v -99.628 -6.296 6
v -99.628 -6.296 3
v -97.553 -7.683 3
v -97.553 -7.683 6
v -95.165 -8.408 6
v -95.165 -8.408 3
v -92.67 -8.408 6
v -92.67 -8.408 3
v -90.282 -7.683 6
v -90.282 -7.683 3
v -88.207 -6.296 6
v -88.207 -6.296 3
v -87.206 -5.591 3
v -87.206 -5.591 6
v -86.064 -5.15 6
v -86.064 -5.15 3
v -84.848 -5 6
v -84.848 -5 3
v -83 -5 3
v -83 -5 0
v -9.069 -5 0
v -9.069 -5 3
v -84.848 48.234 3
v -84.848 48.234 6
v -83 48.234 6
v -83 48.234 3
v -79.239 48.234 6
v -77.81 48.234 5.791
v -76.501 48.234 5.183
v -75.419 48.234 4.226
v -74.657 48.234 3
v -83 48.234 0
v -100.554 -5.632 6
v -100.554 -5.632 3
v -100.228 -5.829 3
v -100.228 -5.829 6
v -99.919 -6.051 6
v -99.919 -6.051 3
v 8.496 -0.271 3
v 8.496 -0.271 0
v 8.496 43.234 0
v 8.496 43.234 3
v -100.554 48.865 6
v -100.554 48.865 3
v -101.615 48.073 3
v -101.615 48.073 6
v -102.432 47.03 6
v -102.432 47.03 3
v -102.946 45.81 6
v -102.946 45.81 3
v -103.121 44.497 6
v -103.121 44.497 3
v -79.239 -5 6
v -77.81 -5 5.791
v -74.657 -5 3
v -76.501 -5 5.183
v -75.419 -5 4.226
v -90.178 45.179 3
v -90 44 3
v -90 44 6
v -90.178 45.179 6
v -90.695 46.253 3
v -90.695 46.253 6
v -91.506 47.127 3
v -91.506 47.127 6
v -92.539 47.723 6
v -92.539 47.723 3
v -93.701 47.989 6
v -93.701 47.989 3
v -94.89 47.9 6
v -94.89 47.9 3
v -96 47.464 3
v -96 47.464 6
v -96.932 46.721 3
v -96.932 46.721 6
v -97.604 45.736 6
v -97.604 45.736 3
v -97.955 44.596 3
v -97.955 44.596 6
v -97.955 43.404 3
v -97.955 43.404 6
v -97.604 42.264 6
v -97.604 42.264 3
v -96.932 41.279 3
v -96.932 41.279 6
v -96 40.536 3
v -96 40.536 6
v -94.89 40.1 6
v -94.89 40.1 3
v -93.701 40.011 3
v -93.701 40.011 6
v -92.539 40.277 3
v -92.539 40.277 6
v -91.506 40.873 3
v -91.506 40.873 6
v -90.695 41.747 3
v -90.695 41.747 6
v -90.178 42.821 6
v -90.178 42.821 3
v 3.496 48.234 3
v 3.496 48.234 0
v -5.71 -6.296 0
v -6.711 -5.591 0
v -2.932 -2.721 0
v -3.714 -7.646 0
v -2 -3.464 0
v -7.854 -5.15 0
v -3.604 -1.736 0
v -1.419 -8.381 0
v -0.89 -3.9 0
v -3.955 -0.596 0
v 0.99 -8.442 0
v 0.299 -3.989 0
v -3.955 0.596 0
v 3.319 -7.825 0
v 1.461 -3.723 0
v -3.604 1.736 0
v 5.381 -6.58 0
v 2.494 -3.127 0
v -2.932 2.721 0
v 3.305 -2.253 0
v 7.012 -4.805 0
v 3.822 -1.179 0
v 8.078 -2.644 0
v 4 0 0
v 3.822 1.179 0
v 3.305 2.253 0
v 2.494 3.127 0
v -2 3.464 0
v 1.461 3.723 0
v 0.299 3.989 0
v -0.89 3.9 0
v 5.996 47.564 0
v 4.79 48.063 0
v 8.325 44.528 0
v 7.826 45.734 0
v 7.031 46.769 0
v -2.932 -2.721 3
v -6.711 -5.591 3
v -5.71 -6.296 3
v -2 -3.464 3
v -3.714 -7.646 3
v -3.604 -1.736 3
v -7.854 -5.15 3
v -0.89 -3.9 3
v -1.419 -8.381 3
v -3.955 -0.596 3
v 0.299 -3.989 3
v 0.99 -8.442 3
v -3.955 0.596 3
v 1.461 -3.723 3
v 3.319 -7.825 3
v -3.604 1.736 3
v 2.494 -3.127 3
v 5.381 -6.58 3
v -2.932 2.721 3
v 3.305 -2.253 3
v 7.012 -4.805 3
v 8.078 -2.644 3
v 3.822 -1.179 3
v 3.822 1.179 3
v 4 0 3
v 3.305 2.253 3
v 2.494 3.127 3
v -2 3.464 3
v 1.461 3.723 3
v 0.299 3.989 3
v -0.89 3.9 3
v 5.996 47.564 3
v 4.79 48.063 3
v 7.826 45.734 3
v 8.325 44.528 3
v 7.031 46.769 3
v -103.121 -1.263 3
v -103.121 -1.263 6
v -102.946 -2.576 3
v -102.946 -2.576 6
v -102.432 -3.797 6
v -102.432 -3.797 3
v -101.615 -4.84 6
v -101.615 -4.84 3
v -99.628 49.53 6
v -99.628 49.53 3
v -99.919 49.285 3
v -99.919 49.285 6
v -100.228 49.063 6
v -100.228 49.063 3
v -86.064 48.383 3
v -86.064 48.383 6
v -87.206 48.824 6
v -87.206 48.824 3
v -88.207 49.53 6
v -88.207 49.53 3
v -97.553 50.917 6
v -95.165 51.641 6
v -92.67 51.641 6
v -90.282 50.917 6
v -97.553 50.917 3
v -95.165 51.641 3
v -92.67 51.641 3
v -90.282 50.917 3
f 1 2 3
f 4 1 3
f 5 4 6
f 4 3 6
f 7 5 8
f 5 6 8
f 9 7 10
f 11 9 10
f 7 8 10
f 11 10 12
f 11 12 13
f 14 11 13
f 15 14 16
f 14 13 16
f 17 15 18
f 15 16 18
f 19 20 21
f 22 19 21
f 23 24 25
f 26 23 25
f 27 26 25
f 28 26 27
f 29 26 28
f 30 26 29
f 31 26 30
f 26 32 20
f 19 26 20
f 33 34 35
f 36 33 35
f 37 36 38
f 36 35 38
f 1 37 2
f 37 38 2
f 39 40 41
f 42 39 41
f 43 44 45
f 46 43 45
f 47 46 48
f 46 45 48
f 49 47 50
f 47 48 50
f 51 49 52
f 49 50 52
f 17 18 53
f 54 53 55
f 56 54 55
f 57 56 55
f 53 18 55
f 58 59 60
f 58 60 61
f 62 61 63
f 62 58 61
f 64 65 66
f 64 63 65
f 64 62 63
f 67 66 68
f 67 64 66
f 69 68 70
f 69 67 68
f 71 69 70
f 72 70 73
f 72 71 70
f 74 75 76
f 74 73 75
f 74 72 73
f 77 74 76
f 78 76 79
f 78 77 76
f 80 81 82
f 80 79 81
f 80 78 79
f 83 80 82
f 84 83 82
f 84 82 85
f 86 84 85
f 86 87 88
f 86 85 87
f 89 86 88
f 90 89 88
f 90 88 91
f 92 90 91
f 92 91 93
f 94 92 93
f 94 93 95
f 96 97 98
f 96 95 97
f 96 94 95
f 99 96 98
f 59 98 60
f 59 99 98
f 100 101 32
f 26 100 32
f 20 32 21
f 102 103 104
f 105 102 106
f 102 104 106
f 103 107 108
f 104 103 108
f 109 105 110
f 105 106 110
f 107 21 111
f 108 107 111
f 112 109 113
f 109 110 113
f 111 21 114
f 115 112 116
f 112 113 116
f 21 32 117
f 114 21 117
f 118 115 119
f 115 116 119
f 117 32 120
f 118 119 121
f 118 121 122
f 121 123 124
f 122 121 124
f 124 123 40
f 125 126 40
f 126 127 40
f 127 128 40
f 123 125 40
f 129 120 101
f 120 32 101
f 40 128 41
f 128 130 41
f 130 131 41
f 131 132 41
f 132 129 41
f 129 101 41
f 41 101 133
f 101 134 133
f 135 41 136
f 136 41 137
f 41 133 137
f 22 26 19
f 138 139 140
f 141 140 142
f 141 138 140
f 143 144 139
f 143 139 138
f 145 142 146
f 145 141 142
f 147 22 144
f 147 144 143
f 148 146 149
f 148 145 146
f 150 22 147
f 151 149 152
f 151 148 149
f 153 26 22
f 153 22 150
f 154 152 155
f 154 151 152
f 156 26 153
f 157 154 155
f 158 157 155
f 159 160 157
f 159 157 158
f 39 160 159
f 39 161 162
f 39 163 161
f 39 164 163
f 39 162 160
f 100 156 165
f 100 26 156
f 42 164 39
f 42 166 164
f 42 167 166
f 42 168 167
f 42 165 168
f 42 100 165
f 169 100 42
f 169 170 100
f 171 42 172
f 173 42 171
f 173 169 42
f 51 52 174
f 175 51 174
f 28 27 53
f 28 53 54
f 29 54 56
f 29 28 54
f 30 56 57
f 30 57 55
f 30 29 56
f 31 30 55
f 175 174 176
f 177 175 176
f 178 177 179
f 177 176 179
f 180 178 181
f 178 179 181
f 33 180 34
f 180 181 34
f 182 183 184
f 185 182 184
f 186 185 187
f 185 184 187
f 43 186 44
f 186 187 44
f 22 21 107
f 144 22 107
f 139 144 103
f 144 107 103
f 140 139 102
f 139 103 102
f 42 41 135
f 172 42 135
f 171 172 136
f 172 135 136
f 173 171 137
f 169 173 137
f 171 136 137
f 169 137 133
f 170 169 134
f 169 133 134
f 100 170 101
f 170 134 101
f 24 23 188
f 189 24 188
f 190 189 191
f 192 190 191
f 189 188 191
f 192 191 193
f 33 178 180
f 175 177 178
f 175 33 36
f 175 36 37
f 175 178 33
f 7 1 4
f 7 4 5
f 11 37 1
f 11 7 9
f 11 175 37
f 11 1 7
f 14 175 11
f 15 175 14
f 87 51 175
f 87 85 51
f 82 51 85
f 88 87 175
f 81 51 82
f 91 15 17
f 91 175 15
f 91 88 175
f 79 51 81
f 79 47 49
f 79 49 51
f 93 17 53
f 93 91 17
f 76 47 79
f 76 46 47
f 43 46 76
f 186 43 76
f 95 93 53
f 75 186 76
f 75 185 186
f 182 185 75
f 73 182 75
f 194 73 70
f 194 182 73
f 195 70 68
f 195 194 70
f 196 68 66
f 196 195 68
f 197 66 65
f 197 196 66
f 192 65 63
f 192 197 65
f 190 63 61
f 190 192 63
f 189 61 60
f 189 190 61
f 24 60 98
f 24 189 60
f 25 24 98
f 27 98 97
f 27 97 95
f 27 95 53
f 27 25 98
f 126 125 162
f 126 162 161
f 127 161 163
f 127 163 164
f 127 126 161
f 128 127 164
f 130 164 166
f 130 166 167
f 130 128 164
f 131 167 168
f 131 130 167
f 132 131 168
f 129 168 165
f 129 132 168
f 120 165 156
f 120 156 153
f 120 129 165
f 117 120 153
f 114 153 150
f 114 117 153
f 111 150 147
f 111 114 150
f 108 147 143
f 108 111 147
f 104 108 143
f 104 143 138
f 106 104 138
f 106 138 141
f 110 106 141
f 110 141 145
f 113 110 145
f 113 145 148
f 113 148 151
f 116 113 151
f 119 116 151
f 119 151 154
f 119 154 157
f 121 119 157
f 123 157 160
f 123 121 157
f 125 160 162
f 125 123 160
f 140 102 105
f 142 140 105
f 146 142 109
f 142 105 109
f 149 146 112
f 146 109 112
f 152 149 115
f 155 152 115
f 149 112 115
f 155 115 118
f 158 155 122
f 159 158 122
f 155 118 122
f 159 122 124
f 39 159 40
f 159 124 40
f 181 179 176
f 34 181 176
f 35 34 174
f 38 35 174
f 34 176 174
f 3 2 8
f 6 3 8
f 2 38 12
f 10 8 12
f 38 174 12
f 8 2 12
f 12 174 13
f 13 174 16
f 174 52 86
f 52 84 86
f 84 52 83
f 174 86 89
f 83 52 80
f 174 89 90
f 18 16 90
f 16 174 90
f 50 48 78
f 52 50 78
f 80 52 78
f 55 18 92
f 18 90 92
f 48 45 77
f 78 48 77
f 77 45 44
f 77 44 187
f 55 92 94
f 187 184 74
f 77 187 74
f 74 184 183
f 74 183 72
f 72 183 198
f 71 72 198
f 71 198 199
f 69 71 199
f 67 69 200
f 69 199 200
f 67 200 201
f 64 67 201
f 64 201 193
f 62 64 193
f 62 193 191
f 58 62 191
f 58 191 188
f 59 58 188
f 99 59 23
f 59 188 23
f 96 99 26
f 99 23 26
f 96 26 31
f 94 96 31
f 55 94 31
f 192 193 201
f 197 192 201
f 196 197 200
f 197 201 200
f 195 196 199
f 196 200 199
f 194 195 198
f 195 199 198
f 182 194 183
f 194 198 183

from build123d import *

# Parameters (mm, degrees)
F0_R        = 4
F1_DEPTH    = 3
F2_W        = 8.3434091806
F2_H        = 53.2335165143
F3_DEPTH    = 3
F4_DEPTH    = 25
F5_T1_DEPTH = 76.1463949891


# Not quite as in the source:
# - a fillet or chamfer that OpenCascade refuses, or shapes differently, is made with other operations: its cross-section is extruded or revolved along the edge and cut away or added


with BuildPart() as f1:
    # F0 (on Top) → F1 (new body)
    with BuildSketch(Plane.XY):
        with BuildLine():
            ThreePointArc((-9.0691785736, -5), (-7.2689728241, -5.3353178823), (-5.7102235463, -6.2962962963))
            ThreePointArc((-5.7102235463, -6.2962962963), (3.3189020375, -7.8252724723), (8.495672283, -0.2712055688))
            Line((8.495672283, -0.2712055688), (8.495672283, 0.2712055688))
            Line((8.495672283, 0.2712055688), (8.495672283, 43.2335165143))
            ThreePointArc((8.495672283, 43.2335165143), (7.0312061889, 46.7690504202), (3.495672283, 48.2335165143))
            Line((3.495672283, 48.2335165143), (-83, 48.2335165143))
            Line((-83, 48.2335165143), (-83, -5))
            Line((-83, -5), (-9.0691785736, -5))
        make_face()
        Circle(F0_R, mode=Mode.SUBTRACT)
    extrude(amount=F1_DEPTH)


with BuildPart() as f3:
    # F2 (on face) → F3 (new body)
    with BuildSketch(Plane.XY.offset(3)):
        with BuildLine():
            Line((-84.8481242137, -5), (-83, -5))
            Line((-83, -5), (-83, 48.2335165143))
            Line((-83, 48.2335165143), (-84.8481242137, 48.2335165143))
            ThreePointArc((-84.8481242137, 48.2335165143), (-86.6483299633, 48.5688343966), (-88.207079241, 49.5298128106))
            ThreePointArc((-88.207079241, 49.5298128106), (-93.9173027873, 51.7335165143), (-99.6275263337, 49.5298128106))
            ThreePointArc((-99.6275263337, 49.5298128106), (-100.071684304, 49.1710101306), (-100.5538530546, 48.8651850796))
            ThreePointArc((-100.5538530546, 48.8651850796), (-102.4318593611, 47.0303155519), (-103.1212247482, 44.496853645))
            Line((-103.1212247482, 44.496853645), (-103.1212247482, -1.2633371307))
            ThreePointArc((-103.1212247482, -1.2633371307), (-102.4318593611, -3.7967990376), (-100.5538530546, -5.6316685653))
            ThreePointArc((-100.5538530546, -5.6316685653), (-100.071684304, -5.9374936163), (-99.6275263337, -6.2962962963))
            ThreePointArc((-99.6275263337, -6.2962962963), (-93.9173027873, -8.5), (-88.207079241, -6.2962962963))
            ThreePointArc((-88.207079241, -6.2962962963), (-86.6483299633, -5.3353178823), (-84.8481242137, -5))
        make_face()
        with Locations((-78.8282954097, 21.6167582572)):
            Rectangle(F2_W, F2_H)
    extrude(amount=F3_DEPTH)

    # F0 (on Top) → F4 (cut)
    with BuildSketch(Plane.XY):
        with Locations((-94, 44)):
            Circle(F0_R)
    extrude(amount=F4_DEPTH, mode=Mode.SUBTRACT)

    # F5: fillet of radius 5 on 1 edges, made by hand

    # F5_s2 → F5_t1 (cut)
    with BuildSketch(Plane.XZ.offset(-59.6899557517)):
        with BuildLine():
            ThreePointArc((-79.2391665143, 6), (-76.5005537268, 5.1833001327), (-74.6565908194, 3))
            Line((-74.6565908194, 3), (-74.6565908194, 6))
            Line((-74.6565908194, 6), (-79.2391665143, 6))
        make_face()
    extrude(amount=F5_T1_DEPTH, mode=Mode.SUBTRACT)


solid = Compound([f1.part, f3.part])
